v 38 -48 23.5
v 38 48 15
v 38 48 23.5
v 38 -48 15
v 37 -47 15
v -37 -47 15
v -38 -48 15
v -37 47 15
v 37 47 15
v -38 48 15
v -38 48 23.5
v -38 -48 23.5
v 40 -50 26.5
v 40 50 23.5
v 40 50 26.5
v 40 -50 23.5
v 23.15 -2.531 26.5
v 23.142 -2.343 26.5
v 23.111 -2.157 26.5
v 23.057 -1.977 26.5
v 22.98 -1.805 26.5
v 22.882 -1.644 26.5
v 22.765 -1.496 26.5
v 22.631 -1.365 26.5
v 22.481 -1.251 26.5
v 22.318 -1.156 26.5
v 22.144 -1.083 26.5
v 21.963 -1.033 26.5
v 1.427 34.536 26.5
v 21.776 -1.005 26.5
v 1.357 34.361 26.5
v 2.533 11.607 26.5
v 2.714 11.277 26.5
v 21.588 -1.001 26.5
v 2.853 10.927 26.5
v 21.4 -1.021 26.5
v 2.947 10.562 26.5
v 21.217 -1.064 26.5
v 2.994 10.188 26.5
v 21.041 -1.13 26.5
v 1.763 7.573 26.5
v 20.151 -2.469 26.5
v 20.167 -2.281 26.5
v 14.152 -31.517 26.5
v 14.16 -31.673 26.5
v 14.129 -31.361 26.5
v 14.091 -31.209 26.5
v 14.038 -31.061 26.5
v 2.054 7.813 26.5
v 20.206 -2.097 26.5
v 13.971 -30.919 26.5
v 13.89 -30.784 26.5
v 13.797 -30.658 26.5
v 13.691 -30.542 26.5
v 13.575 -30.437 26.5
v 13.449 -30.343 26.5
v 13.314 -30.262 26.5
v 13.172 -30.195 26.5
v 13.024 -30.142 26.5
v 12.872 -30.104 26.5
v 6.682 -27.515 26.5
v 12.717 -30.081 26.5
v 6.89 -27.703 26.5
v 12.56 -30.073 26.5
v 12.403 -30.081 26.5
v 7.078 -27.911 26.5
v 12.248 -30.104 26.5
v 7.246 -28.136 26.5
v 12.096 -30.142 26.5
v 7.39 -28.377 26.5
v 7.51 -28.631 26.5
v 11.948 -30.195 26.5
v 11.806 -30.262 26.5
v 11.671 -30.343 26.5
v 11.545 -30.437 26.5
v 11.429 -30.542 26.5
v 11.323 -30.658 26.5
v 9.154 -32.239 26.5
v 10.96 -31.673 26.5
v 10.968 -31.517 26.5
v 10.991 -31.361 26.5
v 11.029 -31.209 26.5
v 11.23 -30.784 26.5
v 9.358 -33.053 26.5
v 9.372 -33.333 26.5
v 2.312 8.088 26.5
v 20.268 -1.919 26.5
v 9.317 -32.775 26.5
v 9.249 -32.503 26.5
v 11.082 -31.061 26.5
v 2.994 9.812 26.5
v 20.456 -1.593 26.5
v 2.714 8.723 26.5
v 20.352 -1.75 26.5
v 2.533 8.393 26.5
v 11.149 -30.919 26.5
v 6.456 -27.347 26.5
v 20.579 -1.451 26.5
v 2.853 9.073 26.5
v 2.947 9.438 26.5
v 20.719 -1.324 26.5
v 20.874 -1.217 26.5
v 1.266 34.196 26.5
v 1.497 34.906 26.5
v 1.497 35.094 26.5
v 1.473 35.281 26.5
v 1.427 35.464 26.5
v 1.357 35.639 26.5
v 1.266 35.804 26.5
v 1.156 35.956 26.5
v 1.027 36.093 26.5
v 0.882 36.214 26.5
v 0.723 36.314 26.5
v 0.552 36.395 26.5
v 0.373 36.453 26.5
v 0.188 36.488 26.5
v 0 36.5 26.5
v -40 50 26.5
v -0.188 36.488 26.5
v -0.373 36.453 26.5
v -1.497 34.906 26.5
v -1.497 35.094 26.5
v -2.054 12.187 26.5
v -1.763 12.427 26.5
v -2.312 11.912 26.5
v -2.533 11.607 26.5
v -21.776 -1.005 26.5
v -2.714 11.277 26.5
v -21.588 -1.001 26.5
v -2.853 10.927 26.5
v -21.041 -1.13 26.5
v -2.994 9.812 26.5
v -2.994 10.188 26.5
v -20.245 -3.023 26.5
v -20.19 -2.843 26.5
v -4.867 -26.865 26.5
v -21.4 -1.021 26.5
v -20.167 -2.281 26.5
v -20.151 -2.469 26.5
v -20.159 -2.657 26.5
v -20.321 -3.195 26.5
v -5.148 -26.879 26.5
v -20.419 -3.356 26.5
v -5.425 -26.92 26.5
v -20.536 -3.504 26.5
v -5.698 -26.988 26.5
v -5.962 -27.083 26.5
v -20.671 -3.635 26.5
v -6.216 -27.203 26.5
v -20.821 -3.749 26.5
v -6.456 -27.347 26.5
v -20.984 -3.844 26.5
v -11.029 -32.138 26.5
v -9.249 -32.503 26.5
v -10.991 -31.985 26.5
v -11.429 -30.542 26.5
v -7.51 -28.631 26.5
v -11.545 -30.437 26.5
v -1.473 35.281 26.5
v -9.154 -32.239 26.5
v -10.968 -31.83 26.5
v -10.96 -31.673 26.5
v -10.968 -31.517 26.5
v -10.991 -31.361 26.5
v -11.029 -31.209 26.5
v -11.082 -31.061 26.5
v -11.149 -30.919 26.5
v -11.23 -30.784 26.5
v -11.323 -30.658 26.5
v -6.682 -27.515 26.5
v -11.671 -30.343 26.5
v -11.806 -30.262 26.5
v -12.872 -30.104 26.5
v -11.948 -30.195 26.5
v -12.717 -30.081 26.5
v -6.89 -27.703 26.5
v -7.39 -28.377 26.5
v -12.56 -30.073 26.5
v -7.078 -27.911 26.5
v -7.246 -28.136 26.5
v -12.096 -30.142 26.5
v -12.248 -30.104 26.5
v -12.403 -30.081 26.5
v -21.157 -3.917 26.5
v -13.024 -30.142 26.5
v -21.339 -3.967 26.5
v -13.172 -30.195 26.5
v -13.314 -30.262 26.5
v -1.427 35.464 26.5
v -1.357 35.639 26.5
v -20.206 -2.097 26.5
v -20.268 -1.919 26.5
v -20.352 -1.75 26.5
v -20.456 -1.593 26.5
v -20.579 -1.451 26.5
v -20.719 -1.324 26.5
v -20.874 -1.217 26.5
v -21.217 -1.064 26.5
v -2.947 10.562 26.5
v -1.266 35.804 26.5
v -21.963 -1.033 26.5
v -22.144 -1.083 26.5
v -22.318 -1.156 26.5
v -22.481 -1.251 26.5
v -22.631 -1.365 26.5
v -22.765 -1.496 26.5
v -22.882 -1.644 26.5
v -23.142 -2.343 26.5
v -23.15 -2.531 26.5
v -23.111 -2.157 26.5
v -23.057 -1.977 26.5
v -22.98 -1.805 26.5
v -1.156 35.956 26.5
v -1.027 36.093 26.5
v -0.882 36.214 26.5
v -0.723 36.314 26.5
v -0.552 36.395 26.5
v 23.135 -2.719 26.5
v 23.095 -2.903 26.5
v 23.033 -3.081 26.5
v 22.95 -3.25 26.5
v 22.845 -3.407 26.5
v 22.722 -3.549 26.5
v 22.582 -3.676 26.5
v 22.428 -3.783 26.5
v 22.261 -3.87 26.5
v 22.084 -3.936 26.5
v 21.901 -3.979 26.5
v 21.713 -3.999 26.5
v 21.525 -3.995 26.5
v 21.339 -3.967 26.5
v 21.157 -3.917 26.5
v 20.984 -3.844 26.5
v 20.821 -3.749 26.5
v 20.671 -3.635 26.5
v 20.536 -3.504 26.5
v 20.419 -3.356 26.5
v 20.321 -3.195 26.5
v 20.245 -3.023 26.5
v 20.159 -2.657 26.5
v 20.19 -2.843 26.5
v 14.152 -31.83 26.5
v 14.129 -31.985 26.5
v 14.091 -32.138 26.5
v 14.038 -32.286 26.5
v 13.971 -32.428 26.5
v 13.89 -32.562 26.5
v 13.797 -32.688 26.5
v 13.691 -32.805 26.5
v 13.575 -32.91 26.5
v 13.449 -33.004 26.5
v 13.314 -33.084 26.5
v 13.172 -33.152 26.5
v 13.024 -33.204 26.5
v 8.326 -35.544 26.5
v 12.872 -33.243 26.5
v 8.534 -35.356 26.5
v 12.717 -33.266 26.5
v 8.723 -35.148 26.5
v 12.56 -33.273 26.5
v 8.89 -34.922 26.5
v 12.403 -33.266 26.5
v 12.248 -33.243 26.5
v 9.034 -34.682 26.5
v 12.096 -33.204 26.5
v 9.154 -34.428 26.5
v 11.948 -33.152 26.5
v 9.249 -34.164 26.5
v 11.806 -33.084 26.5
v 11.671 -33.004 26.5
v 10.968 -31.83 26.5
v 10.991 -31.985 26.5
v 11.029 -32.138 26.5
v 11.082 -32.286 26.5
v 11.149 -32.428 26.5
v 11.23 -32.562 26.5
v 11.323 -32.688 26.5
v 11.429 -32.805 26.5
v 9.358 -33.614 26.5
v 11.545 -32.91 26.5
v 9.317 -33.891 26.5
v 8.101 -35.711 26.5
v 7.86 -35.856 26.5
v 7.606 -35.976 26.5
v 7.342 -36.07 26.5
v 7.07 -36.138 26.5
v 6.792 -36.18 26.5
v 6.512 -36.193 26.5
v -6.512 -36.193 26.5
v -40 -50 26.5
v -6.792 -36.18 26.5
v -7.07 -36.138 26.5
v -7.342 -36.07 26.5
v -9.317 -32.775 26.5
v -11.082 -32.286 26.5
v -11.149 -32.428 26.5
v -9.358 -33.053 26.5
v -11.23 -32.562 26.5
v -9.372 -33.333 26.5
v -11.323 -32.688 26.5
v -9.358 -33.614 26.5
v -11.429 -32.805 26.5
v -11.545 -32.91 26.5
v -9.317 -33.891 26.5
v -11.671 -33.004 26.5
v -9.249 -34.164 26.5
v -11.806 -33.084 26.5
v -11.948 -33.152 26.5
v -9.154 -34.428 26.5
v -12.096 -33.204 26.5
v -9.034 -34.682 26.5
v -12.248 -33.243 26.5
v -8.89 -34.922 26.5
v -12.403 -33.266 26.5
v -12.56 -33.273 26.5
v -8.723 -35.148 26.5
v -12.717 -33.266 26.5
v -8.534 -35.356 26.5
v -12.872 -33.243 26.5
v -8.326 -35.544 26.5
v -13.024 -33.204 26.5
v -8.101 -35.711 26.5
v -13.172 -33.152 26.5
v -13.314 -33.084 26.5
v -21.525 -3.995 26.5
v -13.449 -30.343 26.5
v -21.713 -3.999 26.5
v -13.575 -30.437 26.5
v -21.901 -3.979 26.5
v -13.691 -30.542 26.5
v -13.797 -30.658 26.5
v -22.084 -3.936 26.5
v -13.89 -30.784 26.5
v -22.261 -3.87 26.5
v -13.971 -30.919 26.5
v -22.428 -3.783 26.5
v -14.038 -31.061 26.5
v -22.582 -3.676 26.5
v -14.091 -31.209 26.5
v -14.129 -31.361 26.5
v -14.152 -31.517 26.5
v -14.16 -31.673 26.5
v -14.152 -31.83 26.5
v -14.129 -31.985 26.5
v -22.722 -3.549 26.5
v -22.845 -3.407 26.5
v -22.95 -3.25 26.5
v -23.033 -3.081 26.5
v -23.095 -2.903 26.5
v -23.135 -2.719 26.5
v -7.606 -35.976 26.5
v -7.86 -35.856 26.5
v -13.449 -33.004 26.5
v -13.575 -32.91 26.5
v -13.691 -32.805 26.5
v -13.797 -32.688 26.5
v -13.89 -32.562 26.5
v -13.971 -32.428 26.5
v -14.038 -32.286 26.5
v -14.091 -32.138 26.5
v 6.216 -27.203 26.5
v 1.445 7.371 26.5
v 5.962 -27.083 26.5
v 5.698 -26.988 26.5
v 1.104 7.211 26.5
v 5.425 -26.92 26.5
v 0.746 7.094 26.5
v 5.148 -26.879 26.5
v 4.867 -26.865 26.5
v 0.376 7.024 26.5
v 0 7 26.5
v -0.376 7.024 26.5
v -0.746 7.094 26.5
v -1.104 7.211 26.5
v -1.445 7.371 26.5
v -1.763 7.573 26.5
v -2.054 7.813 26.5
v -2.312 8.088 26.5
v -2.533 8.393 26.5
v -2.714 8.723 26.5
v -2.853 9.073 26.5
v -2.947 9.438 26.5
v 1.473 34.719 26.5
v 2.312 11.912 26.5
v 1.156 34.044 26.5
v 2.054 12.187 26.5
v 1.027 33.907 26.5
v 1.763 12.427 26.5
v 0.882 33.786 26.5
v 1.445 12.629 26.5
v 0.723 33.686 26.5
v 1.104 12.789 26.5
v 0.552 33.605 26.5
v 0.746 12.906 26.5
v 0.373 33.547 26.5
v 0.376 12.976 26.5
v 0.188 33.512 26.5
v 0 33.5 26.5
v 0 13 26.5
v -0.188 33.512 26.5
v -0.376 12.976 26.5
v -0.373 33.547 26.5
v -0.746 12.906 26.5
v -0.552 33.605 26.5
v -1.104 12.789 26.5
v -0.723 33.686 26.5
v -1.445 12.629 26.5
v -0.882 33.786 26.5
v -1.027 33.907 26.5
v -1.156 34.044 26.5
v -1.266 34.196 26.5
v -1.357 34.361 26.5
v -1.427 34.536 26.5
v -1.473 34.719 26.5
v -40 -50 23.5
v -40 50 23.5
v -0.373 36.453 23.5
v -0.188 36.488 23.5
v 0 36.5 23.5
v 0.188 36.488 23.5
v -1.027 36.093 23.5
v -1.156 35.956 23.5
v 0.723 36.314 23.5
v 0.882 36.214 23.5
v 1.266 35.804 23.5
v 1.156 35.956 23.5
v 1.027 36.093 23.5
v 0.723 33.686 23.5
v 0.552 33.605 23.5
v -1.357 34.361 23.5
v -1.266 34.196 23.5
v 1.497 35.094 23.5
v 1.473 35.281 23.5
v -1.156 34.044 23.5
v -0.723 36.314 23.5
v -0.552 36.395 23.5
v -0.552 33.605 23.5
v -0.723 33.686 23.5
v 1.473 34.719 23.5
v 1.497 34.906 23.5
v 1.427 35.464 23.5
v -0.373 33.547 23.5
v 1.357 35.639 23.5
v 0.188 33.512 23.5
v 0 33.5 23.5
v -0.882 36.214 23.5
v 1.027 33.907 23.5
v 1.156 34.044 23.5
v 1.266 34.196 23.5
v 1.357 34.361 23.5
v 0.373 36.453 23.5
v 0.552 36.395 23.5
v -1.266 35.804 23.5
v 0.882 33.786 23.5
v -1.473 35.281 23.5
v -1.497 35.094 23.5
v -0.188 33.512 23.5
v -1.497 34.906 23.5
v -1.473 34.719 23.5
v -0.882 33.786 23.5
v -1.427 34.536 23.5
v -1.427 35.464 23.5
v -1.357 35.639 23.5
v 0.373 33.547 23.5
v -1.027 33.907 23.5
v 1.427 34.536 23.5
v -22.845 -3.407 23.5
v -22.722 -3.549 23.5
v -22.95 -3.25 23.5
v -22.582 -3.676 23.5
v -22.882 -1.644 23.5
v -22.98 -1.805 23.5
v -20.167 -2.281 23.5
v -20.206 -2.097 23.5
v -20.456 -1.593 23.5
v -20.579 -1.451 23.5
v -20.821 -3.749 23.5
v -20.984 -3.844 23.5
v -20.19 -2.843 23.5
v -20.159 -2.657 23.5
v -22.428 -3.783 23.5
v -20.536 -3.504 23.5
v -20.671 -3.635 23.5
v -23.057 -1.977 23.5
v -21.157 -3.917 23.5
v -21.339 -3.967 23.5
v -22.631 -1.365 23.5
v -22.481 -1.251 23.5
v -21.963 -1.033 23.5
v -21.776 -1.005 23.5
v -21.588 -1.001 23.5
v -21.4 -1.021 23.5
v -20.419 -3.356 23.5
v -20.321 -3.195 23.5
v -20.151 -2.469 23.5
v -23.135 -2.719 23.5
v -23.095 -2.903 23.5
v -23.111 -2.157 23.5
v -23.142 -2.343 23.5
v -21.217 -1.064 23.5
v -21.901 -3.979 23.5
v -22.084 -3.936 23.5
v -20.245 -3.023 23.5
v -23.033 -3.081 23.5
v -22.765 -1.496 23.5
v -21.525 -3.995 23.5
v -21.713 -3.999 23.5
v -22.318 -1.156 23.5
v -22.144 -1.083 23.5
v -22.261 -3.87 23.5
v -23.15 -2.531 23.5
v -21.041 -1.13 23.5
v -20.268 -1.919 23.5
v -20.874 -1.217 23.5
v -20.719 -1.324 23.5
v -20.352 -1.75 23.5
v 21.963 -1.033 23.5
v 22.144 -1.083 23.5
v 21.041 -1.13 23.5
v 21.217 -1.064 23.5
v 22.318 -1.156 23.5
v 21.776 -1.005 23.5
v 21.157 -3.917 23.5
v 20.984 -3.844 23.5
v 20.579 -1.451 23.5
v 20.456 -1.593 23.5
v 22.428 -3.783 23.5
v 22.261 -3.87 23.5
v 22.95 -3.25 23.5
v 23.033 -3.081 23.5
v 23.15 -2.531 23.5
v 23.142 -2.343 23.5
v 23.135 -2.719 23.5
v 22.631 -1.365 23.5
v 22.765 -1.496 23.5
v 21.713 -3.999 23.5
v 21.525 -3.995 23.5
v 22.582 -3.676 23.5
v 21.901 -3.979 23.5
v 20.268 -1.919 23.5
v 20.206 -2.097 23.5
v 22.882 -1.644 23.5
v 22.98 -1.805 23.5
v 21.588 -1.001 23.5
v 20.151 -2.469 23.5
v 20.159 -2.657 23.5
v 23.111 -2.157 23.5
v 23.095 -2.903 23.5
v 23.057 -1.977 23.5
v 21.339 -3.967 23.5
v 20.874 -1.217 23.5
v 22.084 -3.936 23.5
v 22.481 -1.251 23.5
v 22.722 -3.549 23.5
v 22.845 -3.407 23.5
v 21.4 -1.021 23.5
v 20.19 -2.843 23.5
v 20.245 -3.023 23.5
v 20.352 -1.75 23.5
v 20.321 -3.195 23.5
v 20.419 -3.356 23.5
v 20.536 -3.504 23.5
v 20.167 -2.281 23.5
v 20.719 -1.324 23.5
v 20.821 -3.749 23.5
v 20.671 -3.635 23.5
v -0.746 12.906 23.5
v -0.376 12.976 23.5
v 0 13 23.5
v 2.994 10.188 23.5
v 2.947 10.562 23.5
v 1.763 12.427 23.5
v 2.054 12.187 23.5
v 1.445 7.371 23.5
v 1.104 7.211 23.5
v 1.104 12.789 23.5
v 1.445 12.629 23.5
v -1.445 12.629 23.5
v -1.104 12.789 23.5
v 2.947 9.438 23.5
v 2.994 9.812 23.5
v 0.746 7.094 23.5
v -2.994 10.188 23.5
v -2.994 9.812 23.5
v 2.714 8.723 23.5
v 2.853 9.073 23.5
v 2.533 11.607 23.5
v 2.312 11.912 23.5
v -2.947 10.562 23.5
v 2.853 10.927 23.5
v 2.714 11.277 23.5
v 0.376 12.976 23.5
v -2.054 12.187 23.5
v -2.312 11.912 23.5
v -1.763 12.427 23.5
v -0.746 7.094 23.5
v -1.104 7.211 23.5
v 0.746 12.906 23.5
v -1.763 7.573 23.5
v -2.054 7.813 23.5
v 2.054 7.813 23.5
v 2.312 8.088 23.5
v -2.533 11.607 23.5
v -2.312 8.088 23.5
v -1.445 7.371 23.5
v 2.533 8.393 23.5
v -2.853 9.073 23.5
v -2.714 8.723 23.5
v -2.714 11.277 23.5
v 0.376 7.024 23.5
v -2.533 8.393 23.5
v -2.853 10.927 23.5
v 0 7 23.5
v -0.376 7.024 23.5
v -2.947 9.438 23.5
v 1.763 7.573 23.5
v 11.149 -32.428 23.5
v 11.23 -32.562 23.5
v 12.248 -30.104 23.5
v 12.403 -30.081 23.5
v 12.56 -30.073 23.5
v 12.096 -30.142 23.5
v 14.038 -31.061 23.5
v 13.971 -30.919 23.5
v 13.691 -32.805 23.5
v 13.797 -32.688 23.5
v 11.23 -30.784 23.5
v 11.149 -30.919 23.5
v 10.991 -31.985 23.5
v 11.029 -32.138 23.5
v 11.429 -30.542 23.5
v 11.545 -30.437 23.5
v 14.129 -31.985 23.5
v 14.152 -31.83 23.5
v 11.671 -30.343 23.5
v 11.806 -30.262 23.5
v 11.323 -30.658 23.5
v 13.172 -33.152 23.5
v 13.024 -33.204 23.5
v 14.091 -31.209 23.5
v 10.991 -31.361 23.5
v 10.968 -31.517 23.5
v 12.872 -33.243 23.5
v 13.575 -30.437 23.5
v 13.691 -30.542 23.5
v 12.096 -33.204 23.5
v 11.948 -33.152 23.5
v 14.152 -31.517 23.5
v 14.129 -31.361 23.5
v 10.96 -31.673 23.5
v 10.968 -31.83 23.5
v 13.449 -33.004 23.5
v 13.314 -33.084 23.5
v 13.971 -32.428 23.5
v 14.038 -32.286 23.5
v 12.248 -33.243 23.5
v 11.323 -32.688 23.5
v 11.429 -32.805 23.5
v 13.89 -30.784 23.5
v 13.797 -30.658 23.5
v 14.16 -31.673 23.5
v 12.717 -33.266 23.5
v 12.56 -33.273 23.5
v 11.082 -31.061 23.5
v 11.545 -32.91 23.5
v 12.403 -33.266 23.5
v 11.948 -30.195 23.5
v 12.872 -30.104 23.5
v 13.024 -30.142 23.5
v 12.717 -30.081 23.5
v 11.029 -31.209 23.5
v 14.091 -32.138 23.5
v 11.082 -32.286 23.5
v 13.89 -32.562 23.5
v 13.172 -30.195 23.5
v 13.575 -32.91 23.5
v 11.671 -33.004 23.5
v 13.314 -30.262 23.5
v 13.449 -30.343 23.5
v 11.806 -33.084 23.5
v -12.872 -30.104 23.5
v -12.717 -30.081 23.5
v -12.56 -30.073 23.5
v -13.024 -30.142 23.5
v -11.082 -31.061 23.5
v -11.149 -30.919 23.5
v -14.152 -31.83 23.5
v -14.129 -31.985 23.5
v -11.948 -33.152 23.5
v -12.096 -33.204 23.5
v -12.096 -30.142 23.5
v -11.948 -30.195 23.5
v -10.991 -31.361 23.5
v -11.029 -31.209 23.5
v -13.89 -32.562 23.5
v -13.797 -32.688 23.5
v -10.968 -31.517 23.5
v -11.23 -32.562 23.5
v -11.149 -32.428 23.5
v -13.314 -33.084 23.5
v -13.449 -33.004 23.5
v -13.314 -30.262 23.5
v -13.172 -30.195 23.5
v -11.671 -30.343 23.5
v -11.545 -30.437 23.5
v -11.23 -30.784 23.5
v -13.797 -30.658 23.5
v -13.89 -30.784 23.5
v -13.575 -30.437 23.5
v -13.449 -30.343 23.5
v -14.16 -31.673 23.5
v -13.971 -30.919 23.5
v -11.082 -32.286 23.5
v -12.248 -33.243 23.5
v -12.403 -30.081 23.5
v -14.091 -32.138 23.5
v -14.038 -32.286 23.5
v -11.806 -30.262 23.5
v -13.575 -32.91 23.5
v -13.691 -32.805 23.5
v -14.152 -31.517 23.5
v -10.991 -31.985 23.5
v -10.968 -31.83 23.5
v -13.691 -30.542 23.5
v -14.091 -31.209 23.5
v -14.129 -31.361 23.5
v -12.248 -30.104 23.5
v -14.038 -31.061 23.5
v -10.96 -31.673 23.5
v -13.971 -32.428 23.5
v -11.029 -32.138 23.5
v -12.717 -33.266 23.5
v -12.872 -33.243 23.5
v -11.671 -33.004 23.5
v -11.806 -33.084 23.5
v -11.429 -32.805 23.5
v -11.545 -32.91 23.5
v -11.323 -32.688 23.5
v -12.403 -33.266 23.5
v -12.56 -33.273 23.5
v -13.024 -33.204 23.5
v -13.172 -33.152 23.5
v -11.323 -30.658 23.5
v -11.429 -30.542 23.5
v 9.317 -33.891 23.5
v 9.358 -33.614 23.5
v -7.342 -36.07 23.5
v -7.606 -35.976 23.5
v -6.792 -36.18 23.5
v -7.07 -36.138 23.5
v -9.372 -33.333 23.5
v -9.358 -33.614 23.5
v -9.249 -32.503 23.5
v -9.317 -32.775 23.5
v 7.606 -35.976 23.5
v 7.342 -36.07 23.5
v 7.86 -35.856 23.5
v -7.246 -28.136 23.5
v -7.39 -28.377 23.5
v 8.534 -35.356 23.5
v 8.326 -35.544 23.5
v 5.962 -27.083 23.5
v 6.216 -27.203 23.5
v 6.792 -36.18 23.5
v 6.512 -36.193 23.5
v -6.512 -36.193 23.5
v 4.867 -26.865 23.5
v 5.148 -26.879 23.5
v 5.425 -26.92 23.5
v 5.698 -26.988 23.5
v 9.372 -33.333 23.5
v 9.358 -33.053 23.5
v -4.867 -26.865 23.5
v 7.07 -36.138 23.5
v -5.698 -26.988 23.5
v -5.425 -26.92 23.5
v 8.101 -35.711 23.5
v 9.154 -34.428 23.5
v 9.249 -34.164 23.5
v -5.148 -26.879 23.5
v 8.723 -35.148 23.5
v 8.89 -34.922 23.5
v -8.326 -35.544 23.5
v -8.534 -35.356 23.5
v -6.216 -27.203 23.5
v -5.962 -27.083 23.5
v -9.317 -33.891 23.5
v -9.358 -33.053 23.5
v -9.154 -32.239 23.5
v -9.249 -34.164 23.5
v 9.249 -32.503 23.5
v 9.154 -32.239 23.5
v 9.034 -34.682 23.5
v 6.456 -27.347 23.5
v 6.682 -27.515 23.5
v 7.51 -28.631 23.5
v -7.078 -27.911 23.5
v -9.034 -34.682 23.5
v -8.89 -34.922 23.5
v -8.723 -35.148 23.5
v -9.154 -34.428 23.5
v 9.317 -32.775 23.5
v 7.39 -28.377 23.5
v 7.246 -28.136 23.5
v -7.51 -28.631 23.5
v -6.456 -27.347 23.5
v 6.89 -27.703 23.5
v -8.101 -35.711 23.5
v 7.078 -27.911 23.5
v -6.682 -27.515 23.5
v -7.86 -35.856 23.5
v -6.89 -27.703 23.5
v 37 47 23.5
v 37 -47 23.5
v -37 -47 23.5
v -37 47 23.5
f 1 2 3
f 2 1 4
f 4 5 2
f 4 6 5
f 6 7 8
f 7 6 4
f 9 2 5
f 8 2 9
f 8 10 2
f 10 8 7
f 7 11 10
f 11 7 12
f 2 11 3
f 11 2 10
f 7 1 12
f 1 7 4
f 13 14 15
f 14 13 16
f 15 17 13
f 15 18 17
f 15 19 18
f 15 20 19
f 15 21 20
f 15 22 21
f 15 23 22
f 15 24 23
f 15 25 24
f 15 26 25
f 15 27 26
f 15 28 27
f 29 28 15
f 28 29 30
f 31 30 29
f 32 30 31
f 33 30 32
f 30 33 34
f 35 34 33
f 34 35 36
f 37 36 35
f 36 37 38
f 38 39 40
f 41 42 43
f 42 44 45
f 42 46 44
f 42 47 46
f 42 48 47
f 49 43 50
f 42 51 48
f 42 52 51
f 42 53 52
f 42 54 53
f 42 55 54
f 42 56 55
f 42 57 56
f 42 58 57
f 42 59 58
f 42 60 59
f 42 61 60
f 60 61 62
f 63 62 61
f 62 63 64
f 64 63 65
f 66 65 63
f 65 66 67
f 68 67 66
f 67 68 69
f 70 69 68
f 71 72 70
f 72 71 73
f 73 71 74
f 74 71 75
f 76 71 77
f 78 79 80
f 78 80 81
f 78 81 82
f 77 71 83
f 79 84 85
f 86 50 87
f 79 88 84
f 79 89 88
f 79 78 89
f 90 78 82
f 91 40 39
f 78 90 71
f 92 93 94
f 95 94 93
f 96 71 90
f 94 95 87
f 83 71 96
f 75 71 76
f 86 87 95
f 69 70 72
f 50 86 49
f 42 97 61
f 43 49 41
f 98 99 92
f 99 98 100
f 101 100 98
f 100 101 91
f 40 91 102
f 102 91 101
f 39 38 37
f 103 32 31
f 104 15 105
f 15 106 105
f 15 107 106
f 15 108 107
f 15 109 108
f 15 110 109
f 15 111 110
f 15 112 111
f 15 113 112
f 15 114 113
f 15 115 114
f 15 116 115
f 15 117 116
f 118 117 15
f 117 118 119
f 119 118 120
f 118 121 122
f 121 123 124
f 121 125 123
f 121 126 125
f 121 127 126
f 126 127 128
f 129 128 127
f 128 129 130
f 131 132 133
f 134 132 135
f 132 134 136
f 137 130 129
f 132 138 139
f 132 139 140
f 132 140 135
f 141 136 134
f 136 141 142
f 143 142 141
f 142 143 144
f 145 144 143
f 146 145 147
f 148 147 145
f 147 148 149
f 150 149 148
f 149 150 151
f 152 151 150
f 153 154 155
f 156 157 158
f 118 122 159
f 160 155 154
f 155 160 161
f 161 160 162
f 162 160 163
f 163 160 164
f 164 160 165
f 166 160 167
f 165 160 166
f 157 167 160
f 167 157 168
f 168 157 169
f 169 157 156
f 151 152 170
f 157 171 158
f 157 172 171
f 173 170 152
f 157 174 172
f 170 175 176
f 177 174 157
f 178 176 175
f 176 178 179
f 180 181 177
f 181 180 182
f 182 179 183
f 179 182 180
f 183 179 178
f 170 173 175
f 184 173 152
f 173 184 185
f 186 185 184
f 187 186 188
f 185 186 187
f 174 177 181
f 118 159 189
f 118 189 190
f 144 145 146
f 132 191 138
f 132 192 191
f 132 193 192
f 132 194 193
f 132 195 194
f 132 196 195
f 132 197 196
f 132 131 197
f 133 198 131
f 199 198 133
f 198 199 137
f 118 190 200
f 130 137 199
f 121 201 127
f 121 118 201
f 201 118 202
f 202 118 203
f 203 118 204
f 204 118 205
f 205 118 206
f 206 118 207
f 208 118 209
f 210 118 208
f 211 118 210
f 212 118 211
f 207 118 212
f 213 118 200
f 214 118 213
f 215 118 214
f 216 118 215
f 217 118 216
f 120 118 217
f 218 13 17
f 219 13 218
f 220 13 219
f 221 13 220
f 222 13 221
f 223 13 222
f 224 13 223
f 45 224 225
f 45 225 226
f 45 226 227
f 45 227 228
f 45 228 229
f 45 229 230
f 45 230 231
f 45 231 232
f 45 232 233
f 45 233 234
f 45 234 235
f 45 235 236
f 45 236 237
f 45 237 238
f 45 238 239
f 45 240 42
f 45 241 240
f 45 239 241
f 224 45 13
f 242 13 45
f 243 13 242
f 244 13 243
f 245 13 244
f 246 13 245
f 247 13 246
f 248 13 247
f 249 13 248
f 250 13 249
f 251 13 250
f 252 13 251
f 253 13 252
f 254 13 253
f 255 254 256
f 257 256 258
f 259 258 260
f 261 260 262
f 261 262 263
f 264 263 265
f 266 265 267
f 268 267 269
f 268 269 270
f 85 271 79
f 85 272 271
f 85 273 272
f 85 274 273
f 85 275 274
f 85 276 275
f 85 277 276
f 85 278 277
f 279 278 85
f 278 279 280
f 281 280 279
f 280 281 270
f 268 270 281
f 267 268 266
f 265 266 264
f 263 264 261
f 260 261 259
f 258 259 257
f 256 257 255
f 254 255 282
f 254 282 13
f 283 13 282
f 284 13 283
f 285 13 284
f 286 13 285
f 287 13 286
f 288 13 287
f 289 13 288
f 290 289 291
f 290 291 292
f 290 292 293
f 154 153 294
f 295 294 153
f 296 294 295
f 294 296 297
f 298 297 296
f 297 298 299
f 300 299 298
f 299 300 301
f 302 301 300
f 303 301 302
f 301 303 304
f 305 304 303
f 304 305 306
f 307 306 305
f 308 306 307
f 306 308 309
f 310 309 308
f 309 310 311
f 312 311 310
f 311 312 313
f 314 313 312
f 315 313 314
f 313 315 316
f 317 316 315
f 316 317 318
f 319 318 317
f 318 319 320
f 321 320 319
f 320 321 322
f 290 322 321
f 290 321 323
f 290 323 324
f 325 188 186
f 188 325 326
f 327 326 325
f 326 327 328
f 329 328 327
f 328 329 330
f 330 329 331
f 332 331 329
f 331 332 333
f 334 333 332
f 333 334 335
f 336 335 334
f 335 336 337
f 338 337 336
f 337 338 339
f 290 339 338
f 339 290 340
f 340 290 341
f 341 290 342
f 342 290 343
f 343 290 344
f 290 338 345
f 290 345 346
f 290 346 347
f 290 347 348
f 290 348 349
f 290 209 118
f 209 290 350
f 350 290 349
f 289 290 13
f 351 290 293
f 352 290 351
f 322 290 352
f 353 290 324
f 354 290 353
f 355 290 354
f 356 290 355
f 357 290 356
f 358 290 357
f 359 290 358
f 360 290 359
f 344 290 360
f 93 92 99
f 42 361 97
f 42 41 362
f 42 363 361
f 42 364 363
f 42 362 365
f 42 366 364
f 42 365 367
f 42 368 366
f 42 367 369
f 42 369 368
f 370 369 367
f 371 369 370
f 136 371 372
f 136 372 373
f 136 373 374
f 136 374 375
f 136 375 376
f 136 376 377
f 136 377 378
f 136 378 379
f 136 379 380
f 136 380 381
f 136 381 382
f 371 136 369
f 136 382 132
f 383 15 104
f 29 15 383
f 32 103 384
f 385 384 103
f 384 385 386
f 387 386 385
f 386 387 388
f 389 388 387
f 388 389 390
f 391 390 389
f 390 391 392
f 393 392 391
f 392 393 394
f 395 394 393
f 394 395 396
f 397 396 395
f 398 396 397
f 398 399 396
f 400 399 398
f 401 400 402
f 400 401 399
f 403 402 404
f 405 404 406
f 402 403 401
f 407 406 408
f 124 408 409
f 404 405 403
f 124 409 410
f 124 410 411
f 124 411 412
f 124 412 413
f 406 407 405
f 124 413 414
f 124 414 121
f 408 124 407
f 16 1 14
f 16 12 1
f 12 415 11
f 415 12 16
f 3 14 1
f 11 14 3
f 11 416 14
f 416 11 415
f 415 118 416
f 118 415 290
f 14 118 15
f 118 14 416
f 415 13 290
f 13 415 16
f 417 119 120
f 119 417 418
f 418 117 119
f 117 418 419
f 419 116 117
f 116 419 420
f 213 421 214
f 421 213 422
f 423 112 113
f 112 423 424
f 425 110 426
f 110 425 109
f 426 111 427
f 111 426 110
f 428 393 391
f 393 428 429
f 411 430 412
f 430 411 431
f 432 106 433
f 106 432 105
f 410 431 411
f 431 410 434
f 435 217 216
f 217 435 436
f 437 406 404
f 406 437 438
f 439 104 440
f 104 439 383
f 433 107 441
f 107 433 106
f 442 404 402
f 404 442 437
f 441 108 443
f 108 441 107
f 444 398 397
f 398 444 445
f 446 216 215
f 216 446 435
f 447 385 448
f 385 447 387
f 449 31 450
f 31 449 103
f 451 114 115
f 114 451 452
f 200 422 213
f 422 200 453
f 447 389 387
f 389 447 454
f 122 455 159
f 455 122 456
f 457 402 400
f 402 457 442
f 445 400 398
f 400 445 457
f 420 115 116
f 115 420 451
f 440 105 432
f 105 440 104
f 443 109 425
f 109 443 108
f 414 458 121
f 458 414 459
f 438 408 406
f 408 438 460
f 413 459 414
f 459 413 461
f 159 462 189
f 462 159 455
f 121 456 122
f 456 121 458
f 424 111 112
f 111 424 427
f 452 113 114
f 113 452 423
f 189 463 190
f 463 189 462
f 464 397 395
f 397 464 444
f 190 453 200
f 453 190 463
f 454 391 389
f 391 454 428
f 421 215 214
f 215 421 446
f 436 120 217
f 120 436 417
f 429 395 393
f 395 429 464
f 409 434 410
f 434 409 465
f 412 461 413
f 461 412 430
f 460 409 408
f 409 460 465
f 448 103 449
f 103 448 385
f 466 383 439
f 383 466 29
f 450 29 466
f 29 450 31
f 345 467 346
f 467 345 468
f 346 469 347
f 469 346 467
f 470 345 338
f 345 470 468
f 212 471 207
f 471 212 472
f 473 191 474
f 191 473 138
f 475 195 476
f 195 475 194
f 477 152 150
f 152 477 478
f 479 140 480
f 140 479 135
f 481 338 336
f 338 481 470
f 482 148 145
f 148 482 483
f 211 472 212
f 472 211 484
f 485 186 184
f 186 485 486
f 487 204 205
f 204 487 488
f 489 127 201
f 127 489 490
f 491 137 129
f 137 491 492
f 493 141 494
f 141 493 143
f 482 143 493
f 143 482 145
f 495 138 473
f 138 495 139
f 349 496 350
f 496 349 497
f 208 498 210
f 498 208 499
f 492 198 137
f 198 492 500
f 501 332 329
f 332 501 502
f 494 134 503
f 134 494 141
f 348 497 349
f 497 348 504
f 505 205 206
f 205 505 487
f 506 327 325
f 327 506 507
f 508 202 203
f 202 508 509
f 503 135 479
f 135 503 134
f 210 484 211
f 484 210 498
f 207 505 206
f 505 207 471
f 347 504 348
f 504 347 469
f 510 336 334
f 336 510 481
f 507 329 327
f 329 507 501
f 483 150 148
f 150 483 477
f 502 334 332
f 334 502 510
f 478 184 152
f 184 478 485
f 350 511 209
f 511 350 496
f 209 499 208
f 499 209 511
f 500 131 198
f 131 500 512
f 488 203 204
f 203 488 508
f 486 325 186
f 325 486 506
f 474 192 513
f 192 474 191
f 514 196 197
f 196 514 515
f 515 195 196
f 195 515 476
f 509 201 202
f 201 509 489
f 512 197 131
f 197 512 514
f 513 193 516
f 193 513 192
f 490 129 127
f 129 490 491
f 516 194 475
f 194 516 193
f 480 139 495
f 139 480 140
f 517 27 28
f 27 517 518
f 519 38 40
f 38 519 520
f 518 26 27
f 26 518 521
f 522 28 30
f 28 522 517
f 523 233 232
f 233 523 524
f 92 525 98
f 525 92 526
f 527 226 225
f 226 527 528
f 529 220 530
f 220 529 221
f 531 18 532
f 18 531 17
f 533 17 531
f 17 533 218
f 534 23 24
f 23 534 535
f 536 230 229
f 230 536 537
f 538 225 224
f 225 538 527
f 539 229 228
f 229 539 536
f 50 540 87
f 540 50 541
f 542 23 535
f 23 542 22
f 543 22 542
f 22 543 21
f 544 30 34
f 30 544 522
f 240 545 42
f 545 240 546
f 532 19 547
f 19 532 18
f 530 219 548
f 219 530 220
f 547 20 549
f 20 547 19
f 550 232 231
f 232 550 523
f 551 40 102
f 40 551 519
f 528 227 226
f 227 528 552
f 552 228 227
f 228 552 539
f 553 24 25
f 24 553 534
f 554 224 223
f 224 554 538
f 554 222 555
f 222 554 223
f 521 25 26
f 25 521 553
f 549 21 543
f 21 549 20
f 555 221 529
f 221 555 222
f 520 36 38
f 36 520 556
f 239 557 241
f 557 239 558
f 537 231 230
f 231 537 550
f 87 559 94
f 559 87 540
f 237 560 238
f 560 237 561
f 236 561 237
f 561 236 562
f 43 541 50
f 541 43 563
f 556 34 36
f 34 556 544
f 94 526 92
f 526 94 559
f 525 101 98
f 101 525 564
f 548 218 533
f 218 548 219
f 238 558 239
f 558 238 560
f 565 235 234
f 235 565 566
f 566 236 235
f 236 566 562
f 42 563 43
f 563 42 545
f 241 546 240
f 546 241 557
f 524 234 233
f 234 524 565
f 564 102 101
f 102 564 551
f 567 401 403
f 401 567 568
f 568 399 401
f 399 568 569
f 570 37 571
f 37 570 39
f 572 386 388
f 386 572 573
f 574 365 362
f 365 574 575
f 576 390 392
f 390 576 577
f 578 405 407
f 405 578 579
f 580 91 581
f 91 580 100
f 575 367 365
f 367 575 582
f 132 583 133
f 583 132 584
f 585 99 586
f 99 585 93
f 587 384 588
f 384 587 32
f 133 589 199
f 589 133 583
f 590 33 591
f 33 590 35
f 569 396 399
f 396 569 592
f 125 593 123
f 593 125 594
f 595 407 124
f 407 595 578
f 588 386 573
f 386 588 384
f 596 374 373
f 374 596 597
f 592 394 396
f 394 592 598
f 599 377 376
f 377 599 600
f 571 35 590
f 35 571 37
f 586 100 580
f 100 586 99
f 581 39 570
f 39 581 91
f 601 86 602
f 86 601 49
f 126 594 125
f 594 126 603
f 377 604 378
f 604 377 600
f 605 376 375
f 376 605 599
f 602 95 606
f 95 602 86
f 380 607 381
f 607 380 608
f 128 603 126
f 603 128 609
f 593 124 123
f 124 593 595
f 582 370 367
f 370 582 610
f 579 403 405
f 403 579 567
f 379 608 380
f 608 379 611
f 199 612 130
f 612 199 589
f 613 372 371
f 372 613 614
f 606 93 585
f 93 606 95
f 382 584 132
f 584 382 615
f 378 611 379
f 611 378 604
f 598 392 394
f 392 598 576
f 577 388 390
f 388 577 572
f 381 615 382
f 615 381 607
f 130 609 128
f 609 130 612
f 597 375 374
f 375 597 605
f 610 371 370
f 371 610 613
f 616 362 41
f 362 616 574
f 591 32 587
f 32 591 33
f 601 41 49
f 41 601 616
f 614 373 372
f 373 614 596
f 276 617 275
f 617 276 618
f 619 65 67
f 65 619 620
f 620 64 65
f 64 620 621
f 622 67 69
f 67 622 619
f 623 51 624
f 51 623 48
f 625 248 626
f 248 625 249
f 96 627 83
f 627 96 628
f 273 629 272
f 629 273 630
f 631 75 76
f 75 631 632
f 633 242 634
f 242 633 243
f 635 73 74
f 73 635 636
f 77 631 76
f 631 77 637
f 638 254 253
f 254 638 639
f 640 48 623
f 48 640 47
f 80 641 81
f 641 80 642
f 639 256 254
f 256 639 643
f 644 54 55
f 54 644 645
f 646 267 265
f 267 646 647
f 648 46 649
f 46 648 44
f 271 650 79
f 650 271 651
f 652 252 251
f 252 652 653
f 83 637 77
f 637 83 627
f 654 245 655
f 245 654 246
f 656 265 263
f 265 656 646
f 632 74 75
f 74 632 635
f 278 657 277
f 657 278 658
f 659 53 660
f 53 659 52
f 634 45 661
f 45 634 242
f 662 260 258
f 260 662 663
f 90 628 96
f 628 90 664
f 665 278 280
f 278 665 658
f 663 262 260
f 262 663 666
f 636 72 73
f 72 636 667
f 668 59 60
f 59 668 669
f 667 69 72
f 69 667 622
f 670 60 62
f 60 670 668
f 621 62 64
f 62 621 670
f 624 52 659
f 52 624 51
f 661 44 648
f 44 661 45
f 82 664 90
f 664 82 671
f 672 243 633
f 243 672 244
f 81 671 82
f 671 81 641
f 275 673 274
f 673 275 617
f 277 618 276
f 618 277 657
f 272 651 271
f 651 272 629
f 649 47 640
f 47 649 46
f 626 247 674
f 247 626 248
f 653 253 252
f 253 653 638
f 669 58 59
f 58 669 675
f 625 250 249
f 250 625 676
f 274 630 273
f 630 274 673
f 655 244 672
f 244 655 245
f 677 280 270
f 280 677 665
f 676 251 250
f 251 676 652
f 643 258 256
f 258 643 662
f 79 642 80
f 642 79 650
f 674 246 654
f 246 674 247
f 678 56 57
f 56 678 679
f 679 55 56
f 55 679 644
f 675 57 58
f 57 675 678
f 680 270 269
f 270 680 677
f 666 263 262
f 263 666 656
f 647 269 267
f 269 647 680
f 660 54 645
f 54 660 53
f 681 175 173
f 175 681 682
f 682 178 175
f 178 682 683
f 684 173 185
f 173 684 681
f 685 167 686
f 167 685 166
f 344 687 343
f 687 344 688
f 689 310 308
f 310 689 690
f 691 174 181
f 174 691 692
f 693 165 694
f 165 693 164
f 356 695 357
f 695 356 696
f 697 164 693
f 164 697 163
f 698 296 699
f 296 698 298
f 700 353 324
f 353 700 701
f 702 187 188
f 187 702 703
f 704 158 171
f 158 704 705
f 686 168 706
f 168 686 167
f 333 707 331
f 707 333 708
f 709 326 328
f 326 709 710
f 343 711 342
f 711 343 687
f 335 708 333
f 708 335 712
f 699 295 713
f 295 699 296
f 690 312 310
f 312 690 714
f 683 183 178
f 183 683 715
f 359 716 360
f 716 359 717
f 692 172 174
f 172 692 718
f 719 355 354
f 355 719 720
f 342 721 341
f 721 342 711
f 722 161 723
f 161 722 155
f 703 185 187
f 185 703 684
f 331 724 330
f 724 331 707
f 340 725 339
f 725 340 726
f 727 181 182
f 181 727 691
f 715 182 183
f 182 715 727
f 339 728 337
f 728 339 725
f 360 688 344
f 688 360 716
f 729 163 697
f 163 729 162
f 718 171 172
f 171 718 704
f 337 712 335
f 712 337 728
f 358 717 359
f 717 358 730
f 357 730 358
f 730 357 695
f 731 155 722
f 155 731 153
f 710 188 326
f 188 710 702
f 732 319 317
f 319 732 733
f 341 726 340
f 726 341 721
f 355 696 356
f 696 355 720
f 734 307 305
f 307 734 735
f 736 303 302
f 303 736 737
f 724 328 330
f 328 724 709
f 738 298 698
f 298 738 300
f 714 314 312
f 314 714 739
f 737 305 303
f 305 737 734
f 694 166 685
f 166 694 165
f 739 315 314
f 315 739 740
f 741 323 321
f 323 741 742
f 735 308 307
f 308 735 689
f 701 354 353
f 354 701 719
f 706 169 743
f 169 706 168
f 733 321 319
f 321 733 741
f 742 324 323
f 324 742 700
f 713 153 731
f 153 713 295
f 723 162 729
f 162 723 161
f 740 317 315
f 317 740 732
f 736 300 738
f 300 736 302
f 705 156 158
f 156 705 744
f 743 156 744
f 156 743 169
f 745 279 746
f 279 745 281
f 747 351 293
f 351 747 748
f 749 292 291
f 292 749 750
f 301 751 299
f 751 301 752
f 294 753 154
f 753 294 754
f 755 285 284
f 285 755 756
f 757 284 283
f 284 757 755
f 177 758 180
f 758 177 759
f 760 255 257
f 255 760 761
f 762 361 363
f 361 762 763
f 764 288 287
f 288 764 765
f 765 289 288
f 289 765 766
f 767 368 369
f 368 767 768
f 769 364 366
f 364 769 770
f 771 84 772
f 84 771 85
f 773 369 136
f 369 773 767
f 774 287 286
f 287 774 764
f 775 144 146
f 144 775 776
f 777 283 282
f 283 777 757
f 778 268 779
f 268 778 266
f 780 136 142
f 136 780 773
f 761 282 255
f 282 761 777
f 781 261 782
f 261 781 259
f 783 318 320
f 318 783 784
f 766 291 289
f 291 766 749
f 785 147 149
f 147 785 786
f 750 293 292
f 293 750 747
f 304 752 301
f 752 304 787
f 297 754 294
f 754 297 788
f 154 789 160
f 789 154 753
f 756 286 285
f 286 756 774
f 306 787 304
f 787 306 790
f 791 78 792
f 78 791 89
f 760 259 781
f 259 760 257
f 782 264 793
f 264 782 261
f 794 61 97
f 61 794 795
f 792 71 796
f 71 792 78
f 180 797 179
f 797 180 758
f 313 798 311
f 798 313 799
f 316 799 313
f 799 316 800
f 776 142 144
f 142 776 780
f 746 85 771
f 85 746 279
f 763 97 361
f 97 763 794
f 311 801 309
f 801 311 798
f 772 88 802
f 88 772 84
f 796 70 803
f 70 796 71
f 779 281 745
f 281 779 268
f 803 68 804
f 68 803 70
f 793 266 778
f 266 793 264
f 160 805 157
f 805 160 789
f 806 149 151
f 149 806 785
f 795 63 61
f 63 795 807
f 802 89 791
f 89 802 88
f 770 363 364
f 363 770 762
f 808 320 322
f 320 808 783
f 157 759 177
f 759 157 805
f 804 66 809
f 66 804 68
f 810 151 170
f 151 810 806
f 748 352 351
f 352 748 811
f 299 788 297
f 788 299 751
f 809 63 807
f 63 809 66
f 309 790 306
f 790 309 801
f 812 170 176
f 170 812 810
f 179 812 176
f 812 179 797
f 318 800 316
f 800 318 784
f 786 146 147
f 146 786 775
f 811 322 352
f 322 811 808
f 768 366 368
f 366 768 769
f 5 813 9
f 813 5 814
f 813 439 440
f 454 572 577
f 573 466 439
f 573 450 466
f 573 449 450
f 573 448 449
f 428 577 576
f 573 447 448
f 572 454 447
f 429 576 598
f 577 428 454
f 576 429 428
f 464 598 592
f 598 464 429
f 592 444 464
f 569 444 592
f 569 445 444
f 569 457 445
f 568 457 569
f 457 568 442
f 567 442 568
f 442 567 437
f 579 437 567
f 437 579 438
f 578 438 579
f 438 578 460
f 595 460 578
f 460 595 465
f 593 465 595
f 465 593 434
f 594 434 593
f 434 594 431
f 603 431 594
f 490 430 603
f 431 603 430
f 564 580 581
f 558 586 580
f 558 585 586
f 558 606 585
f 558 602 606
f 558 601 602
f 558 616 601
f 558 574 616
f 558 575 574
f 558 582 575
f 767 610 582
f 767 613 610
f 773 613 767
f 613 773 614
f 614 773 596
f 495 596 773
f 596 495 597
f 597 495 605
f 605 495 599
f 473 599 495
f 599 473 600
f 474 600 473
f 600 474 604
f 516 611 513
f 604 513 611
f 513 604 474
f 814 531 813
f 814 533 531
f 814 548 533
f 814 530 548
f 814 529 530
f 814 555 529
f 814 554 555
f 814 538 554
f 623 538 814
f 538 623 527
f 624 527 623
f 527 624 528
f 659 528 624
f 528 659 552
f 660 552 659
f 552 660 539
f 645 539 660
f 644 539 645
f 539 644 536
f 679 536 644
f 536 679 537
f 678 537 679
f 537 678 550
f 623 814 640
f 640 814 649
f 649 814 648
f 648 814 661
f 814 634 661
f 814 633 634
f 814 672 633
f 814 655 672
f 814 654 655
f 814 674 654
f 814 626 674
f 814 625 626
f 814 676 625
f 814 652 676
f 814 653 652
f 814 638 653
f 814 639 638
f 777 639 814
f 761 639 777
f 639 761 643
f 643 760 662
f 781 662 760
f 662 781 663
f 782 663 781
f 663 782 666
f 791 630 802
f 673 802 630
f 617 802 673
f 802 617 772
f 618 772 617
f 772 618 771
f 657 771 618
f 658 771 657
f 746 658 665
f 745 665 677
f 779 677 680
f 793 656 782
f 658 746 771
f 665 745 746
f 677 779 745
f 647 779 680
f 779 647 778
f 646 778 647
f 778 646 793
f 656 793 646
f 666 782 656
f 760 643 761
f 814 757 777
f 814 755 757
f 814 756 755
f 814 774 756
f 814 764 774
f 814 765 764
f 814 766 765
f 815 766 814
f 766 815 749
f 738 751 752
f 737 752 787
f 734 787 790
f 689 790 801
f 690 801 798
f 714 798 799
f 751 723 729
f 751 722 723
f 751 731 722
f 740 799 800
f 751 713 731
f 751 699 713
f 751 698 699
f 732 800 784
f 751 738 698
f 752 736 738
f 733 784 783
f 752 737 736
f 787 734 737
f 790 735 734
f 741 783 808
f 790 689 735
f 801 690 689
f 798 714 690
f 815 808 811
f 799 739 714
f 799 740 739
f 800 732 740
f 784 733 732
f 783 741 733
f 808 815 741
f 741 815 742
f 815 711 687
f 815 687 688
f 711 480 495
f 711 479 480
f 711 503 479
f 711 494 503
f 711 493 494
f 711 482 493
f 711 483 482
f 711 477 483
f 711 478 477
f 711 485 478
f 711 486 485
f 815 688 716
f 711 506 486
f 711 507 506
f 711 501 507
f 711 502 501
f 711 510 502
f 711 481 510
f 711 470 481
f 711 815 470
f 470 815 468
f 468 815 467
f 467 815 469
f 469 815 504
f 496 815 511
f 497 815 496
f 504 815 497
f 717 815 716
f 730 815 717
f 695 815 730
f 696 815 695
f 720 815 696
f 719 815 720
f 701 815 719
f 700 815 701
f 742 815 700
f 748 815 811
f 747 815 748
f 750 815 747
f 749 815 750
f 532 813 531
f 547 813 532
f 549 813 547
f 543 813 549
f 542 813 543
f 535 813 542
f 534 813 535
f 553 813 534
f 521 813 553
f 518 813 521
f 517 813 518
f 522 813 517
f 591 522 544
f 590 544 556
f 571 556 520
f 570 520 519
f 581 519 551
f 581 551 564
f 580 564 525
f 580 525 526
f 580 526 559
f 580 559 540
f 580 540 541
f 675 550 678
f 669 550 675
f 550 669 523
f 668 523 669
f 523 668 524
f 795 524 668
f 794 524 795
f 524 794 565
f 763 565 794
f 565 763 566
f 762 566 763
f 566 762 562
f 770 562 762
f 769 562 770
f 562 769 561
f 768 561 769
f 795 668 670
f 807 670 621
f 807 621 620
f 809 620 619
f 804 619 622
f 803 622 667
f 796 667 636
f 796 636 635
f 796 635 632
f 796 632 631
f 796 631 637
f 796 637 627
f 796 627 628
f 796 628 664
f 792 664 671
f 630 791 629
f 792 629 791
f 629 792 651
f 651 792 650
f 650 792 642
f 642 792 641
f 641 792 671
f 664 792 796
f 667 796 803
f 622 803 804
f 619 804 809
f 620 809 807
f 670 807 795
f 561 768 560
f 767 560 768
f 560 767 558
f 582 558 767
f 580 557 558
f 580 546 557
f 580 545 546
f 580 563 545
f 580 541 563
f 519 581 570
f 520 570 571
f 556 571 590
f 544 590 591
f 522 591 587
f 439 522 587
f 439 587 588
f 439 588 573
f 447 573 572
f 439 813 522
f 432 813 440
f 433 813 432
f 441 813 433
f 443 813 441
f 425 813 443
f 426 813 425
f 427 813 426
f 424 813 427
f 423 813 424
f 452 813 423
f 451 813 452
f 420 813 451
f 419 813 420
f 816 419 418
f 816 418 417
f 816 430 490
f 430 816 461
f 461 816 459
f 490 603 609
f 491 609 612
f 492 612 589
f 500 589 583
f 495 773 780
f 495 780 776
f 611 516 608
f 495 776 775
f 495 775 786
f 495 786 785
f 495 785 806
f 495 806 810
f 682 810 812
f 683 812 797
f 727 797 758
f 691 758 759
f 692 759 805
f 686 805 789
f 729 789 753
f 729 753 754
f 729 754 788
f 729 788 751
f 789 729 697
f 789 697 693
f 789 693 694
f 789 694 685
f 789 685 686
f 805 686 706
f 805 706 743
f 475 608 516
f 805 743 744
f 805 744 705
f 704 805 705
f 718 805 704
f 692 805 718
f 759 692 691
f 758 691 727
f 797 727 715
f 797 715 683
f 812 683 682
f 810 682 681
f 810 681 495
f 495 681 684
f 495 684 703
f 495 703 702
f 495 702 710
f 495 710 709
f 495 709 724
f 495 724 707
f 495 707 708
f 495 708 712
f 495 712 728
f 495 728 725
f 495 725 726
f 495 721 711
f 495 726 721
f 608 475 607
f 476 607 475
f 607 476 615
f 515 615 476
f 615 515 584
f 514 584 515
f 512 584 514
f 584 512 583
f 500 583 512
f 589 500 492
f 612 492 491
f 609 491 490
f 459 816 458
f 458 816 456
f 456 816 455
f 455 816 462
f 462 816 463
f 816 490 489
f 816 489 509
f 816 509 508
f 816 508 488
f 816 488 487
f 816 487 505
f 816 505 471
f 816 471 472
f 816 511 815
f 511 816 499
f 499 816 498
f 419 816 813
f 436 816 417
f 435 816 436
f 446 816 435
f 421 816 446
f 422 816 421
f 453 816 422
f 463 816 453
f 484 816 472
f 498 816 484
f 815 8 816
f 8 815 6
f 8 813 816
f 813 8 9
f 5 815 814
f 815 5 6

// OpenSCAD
$fn = 50;
outerDiam = 6;
screwDiam = 3;
pilarHeight = 8;

boardX = 180;
boardY = 180;
boardZ = 2.4;

boardHoleDiam = 25;
boardHoleSpace = 0.2 * boardHoleDiam;

// First is the board x, y second is the position of the first hole
megaDim = [ [ 101.6, 53.34 ], [ 14, 2.5 ] ];

mega = [
  [ 0, 0 ], [ 79.4, 48.26 ], [ 0, 48.26 ], [ 82.55, 0 ], [ 50.8, 0 ],
  [ 50.8, 33 ]
];

unoDim = [ [ 68.58, 53.34 ], [ 2.58, 7.62 ] ];
uno = [ [ 0, 0 ], [ 0, 27.94 ], [ 50.76, 43.18 ] ];
// https://learn.adafruit.com/introducing-the-raspberry-pi-model-b-plus-plus-differences-vs-model-b/mounting-holes
// https://learn.adafruit.com/assets/17950
raspberryDim = [ [ 85.6, 54 ], [ 25.5, 18 ] ];
raspberryBPlus = [ [], [], [], [], [] ];
raspberryB = [ [ 0, 0 ], [ 55.1, 23.5 ] ];
raspberry3 = [ [], [], [], [], [] ];

LEDDiverDim = [ [ 42.5, 24 ], [ 2, 2 ] ];
LEDDriver = [ [ 0, 0 ], [ 37.6, 0 ], [ 0, 20 ], [ 37.6, 20 ] ];

relaisDim = [ [ 70.15, 50 ], [ 3, 3 ] ];
relais = [ [ 0, 0 ], [ 65.72, 0 ], [ 0, 45 ], [ 65.72, 45 ] ];

PHBoardDim = [ [ 40.5, 20 ], [ 1, 1 ] ];
PHBoard = [ [ 0, 0 ], [ 35.7, 0 ], [ 0, 15.7 ], [ 35.7, 15.7 ] ];

module pillar(base) {
  translate([ 0, 0, boardZ ]) difference() {
    cylinder(h = pilarHeight, d1 = outerDiam, d2 = outerDiam);
    translate([ 0, 0, -1 ])
        cylinder(h = pilarHeight + 2, d1 = screwDiam, d2 = screwDiam);
  }
  if(base){
  cylinder(h = boardZ, d = boardHoleDiam/2);}
}

module mount(component,basePillar) {

  color("Lime", 1.0) {
    for (i = [0:len(component)]) {
      translate([ component[i][0], component[i][1], 0 ]) pillar(basePillar);
    }
  }
}

// This prints the pillars and the board footprint
module fullmodule(boardDim, component, base,basePillar) {

  if (base) {
    cube([ boardDim[0][0], boardDim[0][1], 3 ]);
  }
  translate([ boardDim[1][0], boardDim[1][1], 0 ]) mount(component,basePillar);
}
// mount(mega);

module holes() {
  for (y = [0:boardHoleDiam +
           boardHoleSpace:boardY - 2 * (boardHoleDiam + boardHoleSpace)]) {

    for (x = [0:boardHoleDiam +
             boardHoleSpace:boardX - 2 * (boardHoleDiam + boardHoleSpace)]) {
      translate([ x, y, 0 ]) cylinder(h = 10, d = boardHoleDiam);
    }
  }
}

module board() {

  color("Gray", 1.0) {
    difference() {
      cube([ boardX, boardY, boardZ ]);
      translate([
        (boardHoleDiam + boardHoleSpace), (boardHoleDiam + boardHoleSpace), -5
      ]) holes();
    }
  }
}


module baseSupport(){
    cube([boardX/2-0.2*boardX,10,20]);
    
    
}


module electronicsBase(){
board();
baseShow = false;
basePillar = true;
basePPH = false;
// translate([0,0,0])rotate([0,0,0])mount(uno);
translate([ raspberryDim[0][0] + 10, raspberryDim[0][1] + 10, 0 ])
    rotate([ 0, 0, 180 ])
        fullmodule(raspberryDim, raspberryB, baseShow,basePillar); // mount(raspberryB);
translate([ 70, 120, 0 ]) rotate([ 0, 0, 180 ])
    fullmodule(unoDim, uno, baseShow, basePillar);

translate([ 170, 10, 0 ]) rotate([ 0, 0, 90 ])
    fullmodule(relaisDim, relais, baseShow, basePillar);
translate([ 129, 95, 0 ]) rotate([ 0, 0, 0 ])
    fullmodule(LEDDiverDim, LEDDriver, baseShow, basePillar);
//translate([ 129, 135, 0 ]) rotate([ 0, 0, 0 ])
//    fullmodule(LEDDiverDim, LEDDriver, baseShow, basePillar);

translate([ 140, 155, 0 ]) rotate([ 0, 0, 0 ])
    fullmodule(PHBoardDim, PHBoard, baseShow, basePPH);

// fullmodule(raspberryDim,raspberryB);
// translate([raspberryDim[0][0] + 20,0,0])fullmodule(unoDim,uno);
}


//baseSupport();
//pillar();

boxX = 80;
boxY = 100;
boxZ = 30;
boxThickness = 3;


//OpenScad D-Sub Library by stevetheprinter
//Published on February 2, 2018
//www.thingiverse.com/thing:2779088

// sc = scale, set larger if your part doesn't fit. default is the exact dimensions of the connector housing. recomended 1.1 for most mounting holes,
// sz = size, set to the correct size for your dsub. Common values are 17.04 for db9 or high density db15, 25.37 for standard db15, 39.09 for db25. 
//dp= depth, set to a size that can penetrate the panel you are using it with
module dsub(sc,sz,dp){
    $fn=64;
    
    cs=(sz/2)-2.6;
    cs2=(sz/2)-4.095;
    ns=(sz/2)+4.04;
     translate([1.66,-ns,0]){
    cylinder(r=1.6,h=10);
    }
    translate([1.66,ns,0]){
    cylinder(r=1.6,h=10);
    }
    
    scale([sc,sc,sc]){
    
    hull(){
    translate([0,-cs,0]){
    cylinder(r=2.6,h=10);
    }
    translate([0,cs,0]){
    cylinder(r=2.6,h=10);
    }
    translate([3.28,-cs2,0]){
    cylinder(r=2.6,h=10);
    }
    translate([3.28,cs2,0]){
    cylinder(r=2.6,h=10);
    }
}
}
}

electWireDiam = 5.8;
module cableClampUP(){
    difference(){
    cube([20,5,5], center=true);
    translate([-8,0,-4])cylinder(d=2.5,h=10);
    mirror(){translate([-8,0,-4])cylinder(d=2.5,h=10);}
   translate([0,-10,2.5])rotate([0,90,90])cylinder(d=electWireDiam, h=30);    }

}

module SUB_cableClamp(){
    difference(){
    cube([20,5,5], center=true);
    translate([-8,0,-4])cylinder(d=1.5,h=10);
    mirror(){translate([-8,0,-4])cylinder(d=1.5,h=10);}}
}

module electricalBoxLid(){
    lidZ = 10;
     
   difference(){
    union(){translate([0,0,lidZ/2])cube([boxX-boxThickness-1, boxY-boxThickness-1, lidZ], center=true);
        translate([0,0,lidZ])cube([boxX, boxY, boxThickness], center=true);
    }
    translate([0,0,lidZ/2-0.5*boxThickness])cube([boxX-2*boxThickness, boxY-2*boxThickness, lidZ], center=true);
    //Holes for socket
    translate([0,10,-10])rotate([0,0,90])SUB_socketHoles();
     
   //Serial port 
    translate([0,-boxY/3,5])rotate([0,0,90])dsub(1.1,17.04,10);

    
     
       }
 
}

  


module electricalBox(){
    difference(){
        
        union(){difference(){
        cube([boxX, boxY, boxZ], center=true);
        translate([0,0,boxThickness])cube([boxX-boxThickness, boxY-boxThickness, boxZ], center=true);
    }
    //cable clamp
    translate([-boxX/3,boxY/2-4,-boxZ/2+5])SUB_cableClamp();
    
 //cable clamp
    translate([boxX/3,boxY/2-4,-boxZ/2+5])SUB_cableClamp();

    }
        //Hole for electricity        
    translate([-boxX/3,boxY/2-10,-boxZ/3+boxThickness])rotate([0,90,90])cylinder(d=electWireDiam, h=30);    
   //Hole for electricity        
    translate([boxX/3,boxY/2-10,-boxZ/3+boxThickness])rotate([0,90,90])cylinder(d=electWireDiam, h=30);    
   
    

}

}
  
module SUB_socketHoles(){
 dHole=3;    
 
for ( i = [0 : 3] ){
    rotate( i * 120, [0, 0, 1])
    translate([25, 0, 0])
    cylinder(d=3,h=30);
}
 cylinder(d=6,h=30);
}


attachX = 10;
attachY = 10;
attachZ = 5;

module SUB_support(){    
    difference(){cube([attachX,attachY,attachZ]);
    translate([attachX/2,attachY/2+2,-attachZ/2])cylinder(h=30,d1=3,d2=3);}
}


//electricalBox();
//cableClampUP();
//electricalBoxLid();
translate([0, 0, 15])electricalBoxLid();

//electricalBox();
//translate([-boxX/2,boxY/3,-boxZ/2])rotate([0,0,90])SUB_support();
//translate([-boxX/2,-boxY/3,-boxZ/2])rotate([0,0,90])SUB_support();
//translate([+boxX/2,boxY/3,-boxZ/2])rotate([0,0,-90])SUB_support();
//translate([+boxX/2,-boxY/3,-boxZ/2])rotate([0,0,-90])SUB_support();
